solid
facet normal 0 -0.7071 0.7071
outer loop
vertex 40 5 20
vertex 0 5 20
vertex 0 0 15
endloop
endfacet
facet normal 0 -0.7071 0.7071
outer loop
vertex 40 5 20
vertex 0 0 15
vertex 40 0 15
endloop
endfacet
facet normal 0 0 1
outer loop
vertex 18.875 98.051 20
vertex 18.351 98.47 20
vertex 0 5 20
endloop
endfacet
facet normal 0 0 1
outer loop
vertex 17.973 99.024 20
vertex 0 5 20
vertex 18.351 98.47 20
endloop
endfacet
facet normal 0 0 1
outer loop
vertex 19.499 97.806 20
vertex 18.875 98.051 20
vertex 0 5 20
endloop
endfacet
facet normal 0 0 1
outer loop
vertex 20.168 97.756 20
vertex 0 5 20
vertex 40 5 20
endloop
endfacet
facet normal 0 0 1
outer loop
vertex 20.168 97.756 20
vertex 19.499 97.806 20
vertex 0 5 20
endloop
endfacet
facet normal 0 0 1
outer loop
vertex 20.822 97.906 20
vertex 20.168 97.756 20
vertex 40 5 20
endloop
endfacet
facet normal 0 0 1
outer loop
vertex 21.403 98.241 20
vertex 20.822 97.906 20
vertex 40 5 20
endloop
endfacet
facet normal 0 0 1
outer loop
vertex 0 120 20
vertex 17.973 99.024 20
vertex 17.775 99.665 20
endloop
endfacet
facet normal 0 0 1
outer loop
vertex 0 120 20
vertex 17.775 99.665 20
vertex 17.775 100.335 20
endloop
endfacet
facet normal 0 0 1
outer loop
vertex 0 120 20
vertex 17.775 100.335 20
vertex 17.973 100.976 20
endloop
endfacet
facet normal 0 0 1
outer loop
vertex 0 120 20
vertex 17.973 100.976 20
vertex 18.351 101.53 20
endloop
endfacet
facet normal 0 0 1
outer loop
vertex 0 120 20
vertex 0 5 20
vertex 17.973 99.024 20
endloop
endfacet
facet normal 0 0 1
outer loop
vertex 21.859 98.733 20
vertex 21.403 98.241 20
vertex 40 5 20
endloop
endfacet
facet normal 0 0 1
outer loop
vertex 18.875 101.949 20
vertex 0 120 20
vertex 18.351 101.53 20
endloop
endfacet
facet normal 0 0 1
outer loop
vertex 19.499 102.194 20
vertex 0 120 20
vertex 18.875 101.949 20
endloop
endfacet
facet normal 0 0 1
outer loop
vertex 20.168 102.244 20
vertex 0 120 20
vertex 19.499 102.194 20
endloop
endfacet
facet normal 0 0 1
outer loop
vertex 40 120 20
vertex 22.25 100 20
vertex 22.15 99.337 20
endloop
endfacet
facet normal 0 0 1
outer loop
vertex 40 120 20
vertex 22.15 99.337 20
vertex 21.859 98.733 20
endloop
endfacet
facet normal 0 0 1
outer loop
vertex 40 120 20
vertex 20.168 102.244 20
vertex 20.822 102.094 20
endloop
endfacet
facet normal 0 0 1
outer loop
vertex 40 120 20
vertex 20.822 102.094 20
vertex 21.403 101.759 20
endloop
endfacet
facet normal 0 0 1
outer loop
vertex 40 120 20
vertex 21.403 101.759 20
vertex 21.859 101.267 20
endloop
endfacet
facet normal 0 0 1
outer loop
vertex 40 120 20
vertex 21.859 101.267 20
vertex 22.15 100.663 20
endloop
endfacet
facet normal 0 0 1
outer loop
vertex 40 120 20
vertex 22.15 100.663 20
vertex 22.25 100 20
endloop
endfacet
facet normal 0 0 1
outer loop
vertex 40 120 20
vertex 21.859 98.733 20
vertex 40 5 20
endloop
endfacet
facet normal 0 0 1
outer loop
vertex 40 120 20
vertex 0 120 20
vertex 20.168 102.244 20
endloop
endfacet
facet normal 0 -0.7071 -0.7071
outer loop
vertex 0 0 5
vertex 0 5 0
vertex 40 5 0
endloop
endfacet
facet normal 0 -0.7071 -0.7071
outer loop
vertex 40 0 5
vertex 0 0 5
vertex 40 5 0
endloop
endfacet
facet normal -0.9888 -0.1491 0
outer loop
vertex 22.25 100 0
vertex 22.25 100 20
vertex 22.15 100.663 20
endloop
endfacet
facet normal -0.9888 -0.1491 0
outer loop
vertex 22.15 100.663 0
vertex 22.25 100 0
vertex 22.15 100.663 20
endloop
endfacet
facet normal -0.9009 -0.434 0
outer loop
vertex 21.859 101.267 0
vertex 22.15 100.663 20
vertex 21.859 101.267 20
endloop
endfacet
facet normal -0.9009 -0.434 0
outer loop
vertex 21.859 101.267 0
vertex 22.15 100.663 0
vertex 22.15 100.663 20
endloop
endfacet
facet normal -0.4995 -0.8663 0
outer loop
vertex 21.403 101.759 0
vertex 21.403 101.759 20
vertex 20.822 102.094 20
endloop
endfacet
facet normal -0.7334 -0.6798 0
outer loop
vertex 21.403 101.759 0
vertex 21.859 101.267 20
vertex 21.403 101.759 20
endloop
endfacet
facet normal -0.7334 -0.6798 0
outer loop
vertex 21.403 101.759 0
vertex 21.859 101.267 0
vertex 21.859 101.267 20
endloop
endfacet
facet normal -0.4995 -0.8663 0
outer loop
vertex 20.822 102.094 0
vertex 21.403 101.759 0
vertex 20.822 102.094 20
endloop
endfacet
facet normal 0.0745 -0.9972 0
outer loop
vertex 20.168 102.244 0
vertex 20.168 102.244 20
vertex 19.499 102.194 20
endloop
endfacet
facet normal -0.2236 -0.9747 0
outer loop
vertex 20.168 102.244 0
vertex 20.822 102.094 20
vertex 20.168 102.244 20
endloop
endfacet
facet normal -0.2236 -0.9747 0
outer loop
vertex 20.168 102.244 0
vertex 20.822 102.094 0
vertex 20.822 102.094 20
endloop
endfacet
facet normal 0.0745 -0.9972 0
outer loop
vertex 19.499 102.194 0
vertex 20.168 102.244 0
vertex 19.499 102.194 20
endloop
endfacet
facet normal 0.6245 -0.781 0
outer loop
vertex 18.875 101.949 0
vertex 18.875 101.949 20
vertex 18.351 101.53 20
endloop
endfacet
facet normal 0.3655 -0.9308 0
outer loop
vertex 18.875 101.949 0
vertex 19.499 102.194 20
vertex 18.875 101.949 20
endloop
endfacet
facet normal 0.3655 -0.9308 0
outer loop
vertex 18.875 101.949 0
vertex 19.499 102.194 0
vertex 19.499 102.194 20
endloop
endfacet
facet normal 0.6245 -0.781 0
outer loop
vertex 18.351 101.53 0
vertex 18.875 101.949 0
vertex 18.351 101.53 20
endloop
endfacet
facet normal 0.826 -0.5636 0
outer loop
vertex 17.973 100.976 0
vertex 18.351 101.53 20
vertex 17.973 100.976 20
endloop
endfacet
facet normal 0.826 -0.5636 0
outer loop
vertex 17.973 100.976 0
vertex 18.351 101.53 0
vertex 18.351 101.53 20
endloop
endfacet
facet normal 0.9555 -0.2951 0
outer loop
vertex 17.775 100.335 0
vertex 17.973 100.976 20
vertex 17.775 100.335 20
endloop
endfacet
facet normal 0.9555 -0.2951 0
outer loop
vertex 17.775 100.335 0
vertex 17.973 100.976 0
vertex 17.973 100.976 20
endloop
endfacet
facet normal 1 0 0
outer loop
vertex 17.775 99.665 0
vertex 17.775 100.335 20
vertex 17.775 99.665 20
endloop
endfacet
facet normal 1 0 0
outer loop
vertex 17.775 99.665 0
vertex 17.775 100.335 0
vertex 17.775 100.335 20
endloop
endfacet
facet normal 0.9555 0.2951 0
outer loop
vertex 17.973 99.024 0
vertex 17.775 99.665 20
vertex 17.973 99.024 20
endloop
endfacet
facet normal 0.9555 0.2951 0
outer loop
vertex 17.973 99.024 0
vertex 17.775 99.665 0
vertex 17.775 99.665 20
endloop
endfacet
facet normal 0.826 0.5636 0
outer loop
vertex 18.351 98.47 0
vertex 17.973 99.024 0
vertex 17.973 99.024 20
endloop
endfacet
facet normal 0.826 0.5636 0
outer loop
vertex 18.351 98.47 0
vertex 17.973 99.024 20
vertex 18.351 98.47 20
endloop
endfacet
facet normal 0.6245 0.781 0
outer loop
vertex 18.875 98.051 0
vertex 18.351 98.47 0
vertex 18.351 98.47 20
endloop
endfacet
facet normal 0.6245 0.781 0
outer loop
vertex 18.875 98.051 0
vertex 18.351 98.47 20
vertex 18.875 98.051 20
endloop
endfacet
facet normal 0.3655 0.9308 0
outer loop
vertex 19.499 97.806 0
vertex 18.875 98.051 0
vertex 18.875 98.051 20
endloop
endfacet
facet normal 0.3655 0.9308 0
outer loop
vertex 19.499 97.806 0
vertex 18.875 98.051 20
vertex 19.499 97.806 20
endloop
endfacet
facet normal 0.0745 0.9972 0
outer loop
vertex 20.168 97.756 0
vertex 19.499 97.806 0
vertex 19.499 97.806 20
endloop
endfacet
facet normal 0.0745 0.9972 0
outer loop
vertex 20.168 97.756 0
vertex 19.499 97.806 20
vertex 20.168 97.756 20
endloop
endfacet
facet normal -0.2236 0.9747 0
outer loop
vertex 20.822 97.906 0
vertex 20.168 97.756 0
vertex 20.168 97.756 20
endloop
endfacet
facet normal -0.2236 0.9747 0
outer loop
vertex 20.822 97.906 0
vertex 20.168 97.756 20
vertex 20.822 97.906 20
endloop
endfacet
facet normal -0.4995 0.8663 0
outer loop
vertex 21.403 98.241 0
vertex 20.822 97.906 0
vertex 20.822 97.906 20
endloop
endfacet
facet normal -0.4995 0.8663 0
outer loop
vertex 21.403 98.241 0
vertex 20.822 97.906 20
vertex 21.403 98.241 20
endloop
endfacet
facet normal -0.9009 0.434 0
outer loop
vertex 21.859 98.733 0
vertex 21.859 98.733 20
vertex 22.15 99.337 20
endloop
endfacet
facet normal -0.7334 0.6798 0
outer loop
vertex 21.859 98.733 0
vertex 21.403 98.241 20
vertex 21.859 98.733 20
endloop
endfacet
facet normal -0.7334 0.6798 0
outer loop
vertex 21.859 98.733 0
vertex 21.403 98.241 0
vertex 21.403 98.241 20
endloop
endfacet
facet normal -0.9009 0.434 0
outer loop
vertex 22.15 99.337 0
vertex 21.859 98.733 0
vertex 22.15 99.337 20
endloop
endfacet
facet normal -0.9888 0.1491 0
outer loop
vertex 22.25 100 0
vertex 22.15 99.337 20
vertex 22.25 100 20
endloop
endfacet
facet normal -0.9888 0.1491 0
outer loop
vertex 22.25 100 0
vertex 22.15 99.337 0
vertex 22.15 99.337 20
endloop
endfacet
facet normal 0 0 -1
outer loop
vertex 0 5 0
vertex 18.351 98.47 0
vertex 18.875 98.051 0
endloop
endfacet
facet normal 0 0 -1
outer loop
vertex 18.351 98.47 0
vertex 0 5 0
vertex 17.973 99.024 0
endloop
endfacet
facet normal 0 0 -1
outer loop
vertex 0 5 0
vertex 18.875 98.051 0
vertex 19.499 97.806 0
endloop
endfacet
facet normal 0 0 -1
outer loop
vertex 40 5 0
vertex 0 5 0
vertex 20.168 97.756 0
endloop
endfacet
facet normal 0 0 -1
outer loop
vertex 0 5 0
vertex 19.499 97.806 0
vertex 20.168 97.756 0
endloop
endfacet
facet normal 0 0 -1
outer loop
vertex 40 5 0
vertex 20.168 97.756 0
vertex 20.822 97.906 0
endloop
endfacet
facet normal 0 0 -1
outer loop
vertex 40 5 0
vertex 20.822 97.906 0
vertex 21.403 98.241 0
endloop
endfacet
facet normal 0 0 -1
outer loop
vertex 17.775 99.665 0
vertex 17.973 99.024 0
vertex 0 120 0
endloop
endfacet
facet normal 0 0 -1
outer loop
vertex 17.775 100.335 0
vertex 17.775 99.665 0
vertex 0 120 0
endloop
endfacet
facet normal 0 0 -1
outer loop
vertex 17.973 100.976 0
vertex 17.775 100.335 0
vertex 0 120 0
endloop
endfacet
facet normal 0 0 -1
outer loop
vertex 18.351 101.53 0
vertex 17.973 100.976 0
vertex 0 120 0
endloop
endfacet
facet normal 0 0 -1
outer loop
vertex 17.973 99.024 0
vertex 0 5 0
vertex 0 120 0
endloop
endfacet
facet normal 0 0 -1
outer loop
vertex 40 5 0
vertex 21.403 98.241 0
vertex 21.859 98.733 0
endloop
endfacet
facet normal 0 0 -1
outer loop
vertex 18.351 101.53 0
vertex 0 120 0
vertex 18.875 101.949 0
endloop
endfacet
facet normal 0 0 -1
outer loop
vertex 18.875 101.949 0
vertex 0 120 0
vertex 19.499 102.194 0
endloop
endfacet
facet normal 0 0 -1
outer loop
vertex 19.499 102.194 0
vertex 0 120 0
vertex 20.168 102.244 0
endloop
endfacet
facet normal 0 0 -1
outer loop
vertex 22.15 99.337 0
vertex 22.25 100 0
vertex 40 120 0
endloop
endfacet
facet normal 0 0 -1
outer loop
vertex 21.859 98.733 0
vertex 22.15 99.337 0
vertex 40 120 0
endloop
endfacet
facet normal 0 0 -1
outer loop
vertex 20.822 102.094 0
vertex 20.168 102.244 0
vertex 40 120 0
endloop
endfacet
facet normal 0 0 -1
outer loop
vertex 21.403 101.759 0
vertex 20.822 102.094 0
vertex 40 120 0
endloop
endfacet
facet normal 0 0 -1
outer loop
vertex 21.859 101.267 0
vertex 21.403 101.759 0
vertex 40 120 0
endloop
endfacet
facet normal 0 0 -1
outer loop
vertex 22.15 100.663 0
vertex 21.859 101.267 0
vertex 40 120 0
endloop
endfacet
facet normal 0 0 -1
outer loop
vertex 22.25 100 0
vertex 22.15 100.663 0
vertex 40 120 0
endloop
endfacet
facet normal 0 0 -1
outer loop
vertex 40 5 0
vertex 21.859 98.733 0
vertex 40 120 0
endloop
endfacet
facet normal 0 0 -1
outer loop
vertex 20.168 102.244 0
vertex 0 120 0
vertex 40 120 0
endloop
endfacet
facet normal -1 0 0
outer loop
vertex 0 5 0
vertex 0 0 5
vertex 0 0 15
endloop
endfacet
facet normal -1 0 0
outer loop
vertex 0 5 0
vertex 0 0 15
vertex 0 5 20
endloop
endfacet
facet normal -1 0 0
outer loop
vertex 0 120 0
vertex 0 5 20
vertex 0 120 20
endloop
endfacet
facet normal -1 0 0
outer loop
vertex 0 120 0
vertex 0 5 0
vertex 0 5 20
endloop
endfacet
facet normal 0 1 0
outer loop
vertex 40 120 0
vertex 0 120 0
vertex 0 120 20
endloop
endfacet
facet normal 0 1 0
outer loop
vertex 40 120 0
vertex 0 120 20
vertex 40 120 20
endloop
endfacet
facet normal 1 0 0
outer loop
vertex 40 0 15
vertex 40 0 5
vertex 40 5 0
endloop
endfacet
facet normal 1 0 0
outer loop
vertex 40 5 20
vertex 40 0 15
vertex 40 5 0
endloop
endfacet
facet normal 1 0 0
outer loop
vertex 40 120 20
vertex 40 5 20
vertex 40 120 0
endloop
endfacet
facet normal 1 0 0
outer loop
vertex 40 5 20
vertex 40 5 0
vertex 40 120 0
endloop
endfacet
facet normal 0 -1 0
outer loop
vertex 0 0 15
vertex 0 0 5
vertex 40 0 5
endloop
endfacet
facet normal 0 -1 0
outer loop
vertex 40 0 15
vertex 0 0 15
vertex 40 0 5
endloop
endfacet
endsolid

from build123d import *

# Parameters (mm, degrees)
ESQUISSE1_W                  = 40
ESQUISSE1_H                  = 120
BOSS_EXTRU_1_DEPTH           = 20
CHANFREIN2_SIZE              = 5
ENL_V_MAT_EXTRU_1_DEPTH      = 129.062484749
ENL_V_MAT_EXTRU_1_DEPTH_BACK = 129.062484749
ESQUISSE3_R                  = 2.25


with BuildPart() as part:
    # Esquisse1 → Boss.-Extru.1 (new body)
    with BuildSketch(Plane.XY):
        with Locations((20, 60)):
            Rectangle(ESQUISSE1_W, ESQUISSE1_H)
    extrude(amount=BOSS_EXTRU_1_DEPTH)

    # Chanfrein2
    chanfrein2_edges = [part.edges().sort_by_distance(p)[0] for p in [
        (20, 0, 0),
        (20, 0, 20),
    ]]
    chamfer(chanfrein2_edges, length=CHANFREIN2_SIZE)

    # Esquisse3 → Enlèv. mat.-Extru.1 (cut, two sides: drawn at the far end of the back side and taken through both)
    with BuildSketch(Plane.XY.offset(20).offset(-ENL_V_MAT_EXTRU_1_DEPTH_BACK)):
        with Locations((20, 100)):
            Circle(ESQUISSE3_R)
    extrude(amount=ENL_V_MAT_EXTRU_1_DEPTH + ENL_V_MAT_EXTRU_1_DEPTH_BACK, mode=Mode.SUBTRACT)


solid = part.part
